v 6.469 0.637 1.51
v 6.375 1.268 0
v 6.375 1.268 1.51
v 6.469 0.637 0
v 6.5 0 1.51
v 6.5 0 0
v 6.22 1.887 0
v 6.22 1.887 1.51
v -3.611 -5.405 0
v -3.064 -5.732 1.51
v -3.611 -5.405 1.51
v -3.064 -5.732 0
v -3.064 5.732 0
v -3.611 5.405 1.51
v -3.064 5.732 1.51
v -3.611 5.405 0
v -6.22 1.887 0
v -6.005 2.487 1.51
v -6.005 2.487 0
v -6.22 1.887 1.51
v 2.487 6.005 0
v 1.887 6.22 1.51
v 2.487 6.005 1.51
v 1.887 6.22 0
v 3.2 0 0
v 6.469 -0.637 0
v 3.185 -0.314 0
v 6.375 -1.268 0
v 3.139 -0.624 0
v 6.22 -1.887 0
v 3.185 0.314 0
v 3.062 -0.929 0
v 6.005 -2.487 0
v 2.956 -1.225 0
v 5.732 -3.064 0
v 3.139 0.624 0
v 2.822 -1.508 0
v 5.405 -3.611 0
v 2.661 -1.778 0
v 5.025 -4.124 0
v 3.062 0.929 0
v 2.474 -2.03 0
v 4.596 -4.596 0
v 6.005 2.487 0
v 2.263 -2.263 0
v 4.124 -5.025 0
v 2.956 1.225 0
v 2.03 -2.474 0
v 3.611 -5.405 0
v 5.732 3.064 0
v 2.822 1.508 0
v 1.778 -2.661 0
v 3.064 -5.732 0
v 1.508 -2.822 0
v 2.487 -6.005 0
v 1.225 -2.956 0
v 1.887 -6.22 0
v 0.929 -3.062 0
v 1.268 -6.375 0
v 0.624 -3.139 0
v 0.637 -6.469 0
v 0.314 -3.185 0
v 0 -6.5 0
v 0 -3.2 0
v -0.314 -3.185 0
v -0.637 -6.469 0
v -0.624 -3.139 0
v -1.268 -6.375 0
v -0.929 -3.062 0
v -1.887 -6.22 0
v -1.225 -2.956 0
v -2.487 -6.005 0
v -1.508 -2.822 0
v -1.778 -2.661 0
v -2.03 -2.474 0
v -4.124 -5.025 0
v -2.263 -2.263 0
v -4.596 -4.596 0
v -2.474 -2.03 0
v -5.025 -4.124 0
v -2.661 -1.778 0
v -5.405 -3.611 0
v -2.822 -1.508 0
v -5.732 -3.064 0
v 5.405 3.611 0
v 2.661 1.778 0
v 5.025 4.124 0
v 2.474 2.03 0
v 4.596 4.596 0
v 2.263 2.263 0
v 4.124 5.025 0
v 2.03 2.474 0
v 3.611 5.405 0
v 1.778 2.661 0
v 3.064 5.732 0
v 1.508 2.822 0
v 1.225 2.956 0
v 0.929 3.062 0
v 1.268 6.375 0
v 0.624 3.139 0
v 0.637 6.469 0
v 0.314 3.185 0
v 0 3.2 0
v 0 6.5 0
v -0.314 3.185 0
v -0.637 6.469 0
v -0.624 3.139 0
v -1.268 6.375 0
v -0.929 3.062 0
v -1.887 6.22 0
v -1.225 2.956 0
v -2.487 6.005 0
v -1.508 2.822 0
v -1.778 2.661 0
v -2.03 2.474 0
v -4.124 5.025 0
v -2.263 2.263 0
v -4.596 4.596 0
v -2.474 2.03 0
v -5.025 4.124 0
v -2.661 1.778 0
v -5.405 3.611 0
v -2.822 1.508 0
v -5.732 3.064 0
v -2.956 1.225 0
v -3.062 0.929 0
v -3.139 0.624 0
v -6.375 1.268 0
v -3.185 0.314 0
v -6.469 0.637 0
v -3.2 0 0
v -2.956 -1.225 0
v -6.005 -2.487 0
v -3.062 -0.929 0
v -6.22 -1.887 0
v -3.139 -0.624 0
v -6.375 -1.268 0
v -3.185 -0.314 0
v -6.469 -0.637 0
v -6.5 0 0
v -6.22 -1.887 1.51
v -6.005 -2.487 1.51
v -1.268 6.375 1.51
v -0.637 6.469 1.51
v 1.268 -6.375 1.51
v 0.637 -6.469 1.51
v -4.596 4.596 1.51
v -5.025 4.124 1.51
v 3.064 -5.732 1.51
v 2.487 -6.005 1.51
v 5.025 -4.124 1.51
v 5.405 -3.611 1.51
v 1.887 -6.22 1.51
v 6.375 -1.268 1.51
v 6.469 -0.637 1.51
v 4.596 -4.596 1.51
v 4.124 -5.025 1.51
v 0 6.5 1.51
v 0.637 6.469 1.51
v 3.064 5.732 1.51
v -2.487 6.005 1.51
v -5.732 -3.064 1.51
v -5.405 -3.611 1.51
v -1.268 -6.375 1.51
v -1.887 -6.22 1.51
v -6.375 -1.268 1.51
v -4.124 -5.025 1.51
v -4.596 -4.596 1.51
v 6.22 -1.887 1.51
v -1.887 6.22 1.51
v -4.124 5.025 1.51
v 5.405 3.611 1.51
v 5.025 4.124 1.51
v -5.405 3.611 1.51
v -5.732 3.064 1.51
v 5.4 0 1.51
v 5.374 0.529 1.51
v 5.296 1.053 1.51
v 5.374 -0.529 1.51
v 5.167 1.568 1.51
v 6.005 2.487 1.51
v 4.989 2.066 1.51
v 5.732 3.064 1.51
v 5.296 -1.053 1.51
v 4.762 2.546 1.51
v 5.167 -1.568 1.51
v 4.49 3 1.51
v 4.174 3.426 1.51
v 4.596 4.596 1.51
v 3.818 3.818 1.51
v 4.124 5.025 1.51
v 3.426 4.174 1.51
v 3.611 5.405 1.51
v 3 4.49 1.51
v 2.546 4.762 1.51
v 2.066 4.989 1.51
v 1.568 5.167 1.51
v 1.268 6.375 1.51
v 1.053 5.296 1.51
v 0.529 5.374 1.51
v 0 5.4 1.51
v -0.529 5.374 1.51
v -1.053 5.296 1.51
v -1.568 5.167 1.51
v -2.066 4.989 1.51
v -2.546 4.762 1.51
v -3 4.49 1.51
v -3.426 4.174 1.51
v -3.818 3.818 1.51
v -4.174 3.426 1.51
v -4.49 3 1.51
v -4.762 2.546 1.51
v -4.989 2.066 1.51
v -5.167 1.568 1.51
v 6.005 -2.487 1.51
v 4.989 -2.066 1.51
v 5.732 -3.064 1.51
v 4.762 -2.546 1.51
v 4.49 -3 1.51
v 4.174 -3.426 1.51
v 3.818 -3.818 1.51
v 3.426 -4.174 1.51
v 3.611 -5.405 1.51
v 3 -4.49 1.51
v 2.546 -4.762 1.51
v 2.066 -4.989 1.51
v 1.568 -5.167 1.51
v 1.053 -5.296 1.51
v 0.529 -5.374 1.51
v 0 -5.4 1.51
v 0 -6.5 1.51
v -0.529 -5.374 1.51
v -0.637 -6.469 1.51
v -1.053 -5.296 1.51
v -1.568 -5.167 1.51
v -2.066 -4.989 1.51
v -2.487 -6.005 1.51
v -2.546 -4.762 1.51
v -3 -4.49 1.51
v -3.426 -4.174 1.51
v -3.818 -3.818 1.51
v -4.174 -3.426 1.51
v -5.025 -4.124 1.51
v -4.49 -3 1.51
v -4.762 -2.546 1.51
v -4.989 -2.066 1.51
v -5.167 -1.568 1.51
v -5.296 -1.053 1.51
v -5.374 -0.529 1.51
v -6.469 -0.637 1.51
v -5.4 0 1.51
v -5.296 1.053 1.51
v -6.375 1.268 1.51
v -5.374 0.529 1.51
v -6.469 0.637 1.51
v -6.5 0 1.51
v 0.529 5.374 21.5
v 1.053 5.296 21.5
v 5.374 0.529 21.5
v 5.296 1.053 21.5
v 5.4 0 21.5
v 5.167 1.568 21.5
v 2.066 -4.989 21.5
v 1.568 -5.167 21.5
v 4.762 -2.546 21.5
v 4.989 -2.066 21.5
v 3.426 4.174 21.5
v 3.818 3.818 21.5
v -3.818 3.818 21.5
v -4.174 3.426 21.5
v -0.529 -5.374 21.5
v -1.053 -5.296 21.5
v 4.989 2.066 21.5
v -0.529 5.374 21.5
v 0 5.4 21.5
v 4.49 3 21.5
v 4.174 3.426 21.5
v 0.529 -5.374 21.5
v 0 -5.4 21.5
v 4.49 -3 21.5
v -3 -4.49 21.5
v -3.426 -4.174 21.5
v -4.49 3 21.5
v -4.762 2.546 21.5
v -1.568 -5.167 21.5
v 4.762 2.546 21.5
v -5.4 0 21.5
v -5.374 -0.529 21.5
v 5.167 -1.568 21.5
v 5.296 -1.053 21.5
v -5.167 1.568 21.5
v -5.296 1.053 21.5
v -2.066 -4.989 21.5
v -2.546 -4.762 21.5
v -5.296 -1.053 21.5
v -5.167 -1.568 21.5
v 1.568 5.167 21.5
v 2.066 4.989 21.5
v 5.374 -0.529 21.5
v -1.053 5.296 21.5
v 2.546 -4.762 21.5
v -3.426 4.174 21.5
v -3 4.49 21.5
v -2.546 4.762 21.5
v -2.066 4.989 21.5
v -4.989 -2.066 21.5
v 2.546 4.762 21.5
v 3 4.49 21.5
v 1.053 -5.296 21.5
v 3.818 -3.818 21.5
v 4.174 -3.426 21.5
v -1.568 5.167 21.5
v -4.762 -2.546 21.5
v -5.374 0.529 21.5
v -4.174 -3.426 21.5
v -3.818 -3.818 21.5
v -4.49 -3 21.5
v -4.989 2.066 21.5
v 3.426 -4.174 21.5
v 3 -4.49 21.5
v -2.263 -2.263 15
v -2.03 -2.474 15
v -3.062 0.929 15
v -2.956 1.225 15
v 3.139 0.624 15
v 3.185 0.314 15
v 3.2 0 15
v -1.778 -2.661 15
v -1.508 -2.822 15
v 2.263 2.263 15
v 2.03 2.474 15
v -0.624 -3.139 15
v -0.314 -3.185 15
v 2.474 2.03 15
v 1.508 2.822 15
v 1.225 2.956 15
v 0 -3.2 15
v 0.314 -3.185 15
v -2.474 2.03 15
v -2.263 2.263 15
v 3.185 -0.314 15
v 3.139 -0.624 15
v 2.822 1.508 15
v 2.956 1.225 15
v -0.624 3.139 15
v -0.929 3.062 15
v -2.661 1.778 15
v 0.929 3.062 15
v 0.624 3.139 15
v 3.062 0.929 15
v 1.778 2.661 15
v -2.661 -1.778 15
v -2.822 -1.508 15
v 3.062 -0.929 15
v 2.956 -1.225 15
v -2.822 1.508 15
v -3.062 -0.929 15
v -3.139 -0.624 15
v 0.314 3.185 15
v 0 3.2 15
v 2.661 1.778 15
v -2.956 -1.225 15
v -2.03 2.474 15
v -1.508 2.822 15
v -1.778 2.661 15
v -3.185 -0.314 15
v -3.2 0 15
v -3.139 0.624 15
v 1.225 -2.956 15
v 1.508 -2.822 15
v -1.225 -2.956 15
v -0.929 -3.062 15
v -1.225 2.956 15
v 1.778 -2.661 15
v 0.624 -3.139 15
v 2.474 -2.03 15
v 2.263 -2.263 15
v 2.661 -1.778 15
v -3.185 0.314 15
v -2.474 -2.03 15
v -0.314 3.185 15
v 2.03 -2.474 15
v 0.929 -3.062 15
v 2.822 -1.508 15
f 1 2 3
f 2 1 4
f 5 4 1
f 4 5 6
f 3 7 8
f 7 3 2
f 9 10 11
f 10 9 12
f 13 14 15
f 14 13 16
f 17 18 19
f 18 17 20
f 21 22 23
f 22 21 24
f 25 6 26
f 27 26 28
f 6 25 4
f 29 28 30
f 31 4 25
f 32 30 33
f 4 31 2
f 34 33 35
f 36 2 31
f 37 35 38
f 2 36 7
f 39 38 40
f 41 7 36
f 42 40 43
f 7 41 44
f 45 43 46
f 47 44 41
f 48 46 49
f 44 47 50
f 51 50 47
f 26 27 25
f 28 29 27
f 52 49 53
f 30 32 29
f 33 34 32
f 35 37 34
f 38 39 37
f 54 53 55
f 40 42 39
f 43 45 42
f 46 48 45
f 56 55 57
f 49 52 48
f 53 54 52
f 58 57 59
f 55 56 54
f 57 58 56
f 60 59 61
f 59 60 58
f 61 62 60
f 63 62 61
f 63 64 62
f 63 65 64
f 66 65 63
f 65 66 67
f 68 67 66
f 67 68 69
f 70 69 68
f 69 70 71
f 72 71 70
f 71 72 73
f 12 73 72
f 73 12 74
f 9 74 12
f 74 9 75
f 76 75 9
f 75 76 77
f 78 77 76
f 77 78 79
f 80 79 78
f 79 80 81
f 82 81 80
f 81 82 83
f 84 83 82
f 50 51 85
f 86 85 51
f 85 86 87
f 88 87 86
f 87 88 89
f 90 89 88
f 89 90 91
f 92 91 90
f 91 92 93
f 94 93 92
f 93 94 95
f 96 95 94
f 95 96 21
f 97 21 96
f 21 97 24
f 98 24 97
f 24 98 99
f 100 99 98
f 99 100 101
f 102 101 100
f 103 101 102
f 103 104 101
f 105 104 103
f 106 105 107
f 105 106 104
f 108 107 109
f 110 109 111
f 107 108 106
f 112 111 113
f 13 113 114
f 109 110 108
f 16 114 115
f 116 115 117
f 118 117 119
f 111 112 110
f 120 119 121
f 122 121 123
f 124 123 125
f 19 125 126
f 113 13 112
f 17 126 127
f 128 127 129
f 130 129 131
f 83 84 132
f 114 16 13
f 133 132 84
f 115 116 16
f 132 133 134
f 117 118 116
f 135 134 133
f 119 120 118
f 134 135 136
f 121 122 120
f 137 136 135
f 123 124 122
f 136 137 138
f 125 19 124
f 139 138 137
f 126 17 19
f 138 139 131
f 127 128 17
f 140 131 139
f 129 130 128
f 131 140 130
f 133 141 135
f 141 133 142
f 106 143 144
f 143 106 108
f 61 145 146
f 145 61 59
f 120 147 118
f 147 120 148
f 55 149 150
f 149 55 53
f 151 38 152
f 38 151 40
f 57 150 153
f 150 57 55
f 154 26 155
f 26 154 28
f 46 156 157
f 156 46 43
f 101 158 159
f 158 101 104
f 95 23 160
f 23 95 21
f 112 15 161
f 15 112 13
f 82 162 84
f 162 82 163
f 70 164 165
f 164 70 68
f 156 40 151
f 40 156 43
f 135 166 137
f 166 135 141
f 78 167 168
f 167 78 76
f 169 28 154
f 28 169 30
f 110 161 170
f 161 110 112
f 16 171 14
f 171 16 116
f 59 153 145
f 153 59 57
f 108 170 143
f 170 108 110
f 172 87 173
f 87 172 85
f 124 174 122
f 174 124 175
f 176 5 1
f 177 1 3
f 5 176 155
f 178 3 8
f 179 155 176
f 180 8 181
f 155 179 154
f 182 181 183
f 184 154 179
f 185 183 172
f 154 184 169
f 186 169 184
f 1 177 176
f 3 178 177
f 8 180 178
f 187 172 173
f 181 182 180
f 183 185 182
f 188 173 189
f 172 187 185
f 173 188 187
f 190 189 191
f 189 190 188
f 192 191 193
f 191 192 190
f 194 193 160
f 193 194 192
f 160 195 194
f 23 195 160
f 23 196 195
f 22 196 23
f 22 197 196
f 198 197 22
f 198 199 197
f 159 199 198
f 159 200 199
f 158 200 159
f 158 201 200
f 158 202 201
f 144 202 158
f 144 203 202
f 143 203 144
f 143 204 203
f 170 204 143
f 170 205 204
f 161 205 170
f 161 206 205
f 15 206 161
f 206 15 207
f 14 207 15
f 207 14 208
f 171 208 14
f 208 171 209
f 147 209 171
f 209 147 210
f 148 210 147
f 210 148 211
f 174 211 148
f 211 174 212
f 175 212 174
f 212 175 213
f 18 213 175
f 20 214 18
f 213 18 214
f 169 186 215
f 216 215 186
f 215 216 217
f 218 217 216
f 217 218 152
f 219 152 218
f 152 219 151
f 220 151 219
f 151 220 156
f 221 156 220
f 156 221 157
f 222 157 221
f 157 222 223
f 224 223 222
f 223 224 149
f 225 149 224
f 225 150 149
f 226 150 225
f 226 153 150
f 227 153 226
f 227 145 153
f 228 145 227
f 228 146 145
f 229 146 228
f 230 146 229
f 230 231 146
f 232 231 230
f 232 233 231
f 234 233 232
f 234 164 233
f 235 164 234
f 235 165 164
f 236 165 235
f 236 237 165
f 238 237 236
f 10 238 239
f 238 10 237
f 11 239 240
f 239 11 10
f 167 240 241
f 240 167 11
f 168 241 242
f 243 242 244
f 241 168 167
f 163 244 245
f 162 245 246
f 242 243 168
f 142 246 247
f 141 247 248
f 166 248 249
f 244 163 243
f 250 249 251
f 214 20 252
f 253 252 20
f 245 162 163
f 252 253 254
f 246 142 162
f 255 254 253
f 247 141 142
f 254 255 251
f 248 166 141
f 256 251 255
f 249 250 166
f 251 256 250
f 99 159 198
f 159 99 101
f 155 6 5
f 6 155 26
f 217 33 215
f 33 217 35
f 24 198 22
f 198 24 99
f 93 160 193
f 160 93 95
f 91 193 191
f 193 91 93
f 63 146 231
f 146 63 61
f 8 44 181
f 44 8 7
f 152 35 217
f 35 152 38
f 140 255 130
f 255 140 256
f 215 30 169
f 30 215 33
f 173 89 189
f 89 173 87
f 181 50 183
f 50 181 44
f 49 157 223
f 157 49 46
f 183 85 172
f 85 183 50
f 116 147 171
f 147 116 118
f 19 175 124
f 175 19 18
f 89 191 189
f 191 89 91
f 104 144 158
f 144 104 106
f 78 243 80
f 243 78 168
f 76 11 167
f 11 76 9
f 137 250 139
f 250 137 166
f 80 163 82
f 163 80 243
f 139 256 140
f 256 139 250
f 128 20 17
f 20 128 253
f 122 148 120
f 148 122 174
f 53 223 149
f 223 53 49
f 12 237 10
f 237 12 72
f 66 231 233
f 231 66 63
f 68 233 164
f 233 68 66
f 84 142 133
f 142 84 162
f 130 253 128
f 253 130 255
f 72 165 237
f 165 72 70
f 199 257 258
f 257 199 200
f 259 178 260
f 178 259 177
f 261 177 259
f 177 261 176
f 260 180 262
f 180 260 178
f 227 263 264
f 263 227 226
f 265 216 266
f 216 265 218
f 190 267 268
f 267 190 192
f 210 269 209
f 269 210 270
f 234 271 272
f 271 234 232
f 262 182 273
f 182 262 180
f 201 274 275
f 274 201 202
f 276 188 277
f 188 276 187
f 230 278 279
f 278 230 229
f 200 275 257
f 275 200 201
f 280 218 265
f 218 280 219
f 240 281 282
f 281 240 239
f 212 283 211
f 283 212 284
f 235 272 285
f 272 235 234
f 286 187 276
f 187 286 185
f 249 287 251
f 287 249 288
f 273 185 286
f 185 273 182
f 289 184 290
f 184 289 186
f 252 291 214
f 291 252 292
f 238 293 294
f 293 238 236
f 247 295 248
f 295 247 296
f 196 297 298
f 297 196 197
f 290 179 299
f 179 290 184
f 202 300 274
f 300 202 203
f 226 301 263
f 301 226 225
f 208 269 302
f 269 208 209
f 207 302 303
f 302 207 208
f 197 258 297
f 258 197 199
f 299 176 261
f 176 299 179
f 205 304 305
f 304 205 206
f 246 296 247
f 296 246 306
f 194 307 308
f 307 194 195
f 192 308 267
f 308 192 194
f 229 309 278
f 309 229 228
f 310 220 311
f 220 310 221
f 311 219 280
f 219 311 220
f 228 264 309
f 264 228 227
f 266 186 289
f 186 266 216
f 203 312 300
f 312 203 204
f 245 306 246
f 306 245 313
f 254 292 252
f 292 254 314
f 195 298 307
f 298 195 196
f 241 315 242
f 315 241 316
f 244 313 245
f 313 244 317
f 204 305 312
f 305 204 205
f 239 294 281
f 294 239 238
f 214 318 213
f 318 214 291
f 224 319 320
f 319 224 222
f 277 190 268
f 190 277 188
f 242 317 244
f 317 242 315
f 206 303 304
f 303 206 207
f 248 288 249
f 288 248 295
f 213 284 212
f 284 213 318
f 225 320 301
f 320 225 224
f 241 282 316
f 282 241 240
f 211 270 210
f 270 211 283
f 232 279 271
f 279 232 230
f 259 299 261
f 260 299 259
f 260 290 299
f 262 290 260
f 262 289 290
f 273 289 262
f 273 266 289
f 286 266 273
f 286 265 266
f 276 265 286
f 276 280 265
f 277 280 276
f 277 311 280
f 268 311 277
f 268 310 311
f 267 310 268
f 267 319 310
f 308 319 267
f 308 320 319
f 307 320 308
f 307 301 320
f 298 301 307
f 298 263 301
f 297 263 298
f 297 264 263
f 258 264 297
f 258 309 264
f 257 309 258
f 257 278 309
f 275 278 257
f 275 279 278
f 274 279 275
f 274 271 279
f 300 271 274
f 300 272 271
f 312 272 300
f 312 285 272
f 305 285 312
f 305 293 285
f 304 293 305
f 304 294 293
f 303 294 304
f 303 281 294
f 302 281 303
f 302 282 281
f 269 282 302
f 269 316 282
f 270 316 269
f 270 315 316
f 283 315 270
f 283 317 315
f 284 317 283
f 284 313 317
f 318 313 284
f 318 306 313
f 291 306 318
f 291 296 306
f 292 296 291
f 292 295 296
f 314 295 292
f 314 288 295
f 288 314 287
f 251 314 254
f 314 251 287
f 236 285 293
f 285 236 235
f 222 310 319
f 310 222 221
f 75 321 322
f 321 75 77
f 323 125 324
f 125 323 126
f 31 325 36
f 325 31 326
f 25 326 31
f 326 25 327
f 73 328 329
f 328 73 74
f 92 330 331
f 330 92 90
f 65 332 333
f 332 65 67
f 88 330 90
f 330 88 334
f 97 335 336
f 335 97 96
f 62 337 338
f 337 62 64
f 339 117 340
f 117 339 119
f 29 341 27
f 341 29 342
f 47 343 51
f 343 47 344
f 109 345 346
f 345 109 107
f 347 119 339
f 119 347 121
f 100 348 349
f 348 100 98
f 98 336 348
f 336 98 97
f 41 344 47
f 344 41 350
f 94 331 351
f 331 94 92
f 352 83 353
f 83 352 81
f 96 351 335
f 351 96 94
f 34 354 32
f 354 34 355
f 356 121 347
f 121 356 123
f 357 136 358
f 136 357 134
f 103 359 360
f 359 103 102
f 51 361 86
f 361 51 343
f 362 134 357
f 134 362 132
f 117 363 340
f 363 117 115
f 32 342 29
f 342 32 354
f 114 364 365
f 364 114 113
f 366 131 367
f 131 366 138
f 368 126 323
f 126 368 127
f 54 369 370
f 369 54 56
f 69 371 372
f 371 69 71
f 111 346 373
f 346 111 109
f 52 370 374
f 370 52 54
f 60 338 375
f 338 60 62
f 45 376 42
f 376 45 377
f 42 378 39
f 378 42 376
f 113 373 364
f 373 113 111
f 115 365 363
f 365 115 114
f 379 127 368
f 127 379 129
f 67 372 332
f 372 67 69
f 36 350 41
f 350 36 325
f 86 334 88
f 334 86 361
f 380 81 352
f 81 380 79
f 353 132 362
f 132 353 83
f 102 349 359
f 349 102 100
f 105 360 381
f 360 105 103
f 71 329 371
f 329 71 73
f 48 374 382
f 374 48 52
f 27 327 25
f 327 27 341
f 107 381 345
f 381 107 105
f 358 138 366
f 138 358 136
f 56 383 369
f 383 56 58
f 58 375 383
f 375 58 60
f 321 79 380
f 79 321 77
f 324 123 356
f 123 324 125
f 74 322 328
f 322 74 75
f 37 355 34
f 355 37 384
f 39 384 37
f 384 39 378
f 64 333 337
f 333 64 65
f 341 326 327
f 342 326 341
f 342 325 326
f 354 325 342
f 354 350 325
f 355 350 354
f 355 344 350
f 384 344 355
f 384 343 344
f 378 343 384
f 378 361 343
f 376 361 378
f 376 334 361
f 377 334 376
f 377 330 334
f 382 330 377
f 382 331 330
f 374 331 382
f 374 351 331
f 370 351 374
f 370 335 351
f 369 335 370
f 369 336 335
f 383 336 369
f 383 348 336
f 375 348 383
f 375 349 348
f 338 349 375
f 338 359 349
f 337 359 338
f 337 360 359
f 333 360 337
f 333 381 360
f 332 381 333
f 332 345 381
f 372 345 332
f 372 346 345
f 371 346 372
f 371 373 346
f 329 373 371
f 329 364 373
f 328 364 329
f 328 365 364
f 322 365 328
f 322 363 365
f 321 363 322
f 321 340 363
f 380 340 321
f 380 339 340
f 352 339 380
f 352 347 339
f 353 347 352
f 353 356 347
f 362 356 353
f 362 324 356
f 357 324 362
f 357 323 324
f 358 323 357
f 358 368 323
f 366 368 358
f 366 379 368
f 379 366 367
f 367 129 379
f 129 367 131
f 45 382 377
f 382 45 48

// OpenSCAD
// Adapter sleeve: holds a 0.2 mL PCR tube in a 1.5 mL tube RACK hole
// Category: quick fixes. FOR RACKS ONLY - NEVER put it in a centrifuge rotor: printed
// parts are not rated for centrifugal loads and can shatter. Not for heat blocks or
// thermal cyclers in any printed material: plastic softens and insulates the tube.
// Printed upside down (collar on the bed), so the only overhang is the 6.4 mm bore
// ceiling, a short bridge. The blind bore from the top stops the tube from sliding to the bottom of the rack hole.
// Print: PLA or PETG, 0.15 mm layers.
// SPDX-License-Identifier: CERN-OHL-P-2.0

/* [Adapter] */
// rests on the rack surface
collar_d = 13;
collar_h = 1.5; // 0.1
// fits a 1.5 mL rack hole
body_d = 10.8; // 0.1
// from the collar up
body_h = 20;
// 0.2 mL PCR tube OD ~6.0 mm + clearance
bore_d = 6.4; // 0.1
// from the top (the end that faces up in the rack)
bore_depth = 15;

/* [Hidden] */
$fn = 64;
eps = 0.01;
H = collar_h + body_h;

// parameter checks: stop with a message instead of building a broken part
assert(body_d - bore_d >= 2 * 0.8, "the sleeve wall is under 0.8 mm: reduce bore_d");
assert(bore_depth <= H - 0.8, "the bore goes through: the tube would fall into the rack hole");
assert(collar_d > body_d, "the collar must be wider than the body or the adapter falls into the hole");

difference() {
    union() {
        cylinder(d = collar_d, h = collar_h + eps);
        translate([0, 0, collar_h]) cylinder(d = body_d, h = body_h);
    }
    // printed collar-down, so the rack's top face is z = 0: the bore opens there
    translate([0, 0, -eps]) cylinder(d = bore_d, h = bore_depth + eps);
}
